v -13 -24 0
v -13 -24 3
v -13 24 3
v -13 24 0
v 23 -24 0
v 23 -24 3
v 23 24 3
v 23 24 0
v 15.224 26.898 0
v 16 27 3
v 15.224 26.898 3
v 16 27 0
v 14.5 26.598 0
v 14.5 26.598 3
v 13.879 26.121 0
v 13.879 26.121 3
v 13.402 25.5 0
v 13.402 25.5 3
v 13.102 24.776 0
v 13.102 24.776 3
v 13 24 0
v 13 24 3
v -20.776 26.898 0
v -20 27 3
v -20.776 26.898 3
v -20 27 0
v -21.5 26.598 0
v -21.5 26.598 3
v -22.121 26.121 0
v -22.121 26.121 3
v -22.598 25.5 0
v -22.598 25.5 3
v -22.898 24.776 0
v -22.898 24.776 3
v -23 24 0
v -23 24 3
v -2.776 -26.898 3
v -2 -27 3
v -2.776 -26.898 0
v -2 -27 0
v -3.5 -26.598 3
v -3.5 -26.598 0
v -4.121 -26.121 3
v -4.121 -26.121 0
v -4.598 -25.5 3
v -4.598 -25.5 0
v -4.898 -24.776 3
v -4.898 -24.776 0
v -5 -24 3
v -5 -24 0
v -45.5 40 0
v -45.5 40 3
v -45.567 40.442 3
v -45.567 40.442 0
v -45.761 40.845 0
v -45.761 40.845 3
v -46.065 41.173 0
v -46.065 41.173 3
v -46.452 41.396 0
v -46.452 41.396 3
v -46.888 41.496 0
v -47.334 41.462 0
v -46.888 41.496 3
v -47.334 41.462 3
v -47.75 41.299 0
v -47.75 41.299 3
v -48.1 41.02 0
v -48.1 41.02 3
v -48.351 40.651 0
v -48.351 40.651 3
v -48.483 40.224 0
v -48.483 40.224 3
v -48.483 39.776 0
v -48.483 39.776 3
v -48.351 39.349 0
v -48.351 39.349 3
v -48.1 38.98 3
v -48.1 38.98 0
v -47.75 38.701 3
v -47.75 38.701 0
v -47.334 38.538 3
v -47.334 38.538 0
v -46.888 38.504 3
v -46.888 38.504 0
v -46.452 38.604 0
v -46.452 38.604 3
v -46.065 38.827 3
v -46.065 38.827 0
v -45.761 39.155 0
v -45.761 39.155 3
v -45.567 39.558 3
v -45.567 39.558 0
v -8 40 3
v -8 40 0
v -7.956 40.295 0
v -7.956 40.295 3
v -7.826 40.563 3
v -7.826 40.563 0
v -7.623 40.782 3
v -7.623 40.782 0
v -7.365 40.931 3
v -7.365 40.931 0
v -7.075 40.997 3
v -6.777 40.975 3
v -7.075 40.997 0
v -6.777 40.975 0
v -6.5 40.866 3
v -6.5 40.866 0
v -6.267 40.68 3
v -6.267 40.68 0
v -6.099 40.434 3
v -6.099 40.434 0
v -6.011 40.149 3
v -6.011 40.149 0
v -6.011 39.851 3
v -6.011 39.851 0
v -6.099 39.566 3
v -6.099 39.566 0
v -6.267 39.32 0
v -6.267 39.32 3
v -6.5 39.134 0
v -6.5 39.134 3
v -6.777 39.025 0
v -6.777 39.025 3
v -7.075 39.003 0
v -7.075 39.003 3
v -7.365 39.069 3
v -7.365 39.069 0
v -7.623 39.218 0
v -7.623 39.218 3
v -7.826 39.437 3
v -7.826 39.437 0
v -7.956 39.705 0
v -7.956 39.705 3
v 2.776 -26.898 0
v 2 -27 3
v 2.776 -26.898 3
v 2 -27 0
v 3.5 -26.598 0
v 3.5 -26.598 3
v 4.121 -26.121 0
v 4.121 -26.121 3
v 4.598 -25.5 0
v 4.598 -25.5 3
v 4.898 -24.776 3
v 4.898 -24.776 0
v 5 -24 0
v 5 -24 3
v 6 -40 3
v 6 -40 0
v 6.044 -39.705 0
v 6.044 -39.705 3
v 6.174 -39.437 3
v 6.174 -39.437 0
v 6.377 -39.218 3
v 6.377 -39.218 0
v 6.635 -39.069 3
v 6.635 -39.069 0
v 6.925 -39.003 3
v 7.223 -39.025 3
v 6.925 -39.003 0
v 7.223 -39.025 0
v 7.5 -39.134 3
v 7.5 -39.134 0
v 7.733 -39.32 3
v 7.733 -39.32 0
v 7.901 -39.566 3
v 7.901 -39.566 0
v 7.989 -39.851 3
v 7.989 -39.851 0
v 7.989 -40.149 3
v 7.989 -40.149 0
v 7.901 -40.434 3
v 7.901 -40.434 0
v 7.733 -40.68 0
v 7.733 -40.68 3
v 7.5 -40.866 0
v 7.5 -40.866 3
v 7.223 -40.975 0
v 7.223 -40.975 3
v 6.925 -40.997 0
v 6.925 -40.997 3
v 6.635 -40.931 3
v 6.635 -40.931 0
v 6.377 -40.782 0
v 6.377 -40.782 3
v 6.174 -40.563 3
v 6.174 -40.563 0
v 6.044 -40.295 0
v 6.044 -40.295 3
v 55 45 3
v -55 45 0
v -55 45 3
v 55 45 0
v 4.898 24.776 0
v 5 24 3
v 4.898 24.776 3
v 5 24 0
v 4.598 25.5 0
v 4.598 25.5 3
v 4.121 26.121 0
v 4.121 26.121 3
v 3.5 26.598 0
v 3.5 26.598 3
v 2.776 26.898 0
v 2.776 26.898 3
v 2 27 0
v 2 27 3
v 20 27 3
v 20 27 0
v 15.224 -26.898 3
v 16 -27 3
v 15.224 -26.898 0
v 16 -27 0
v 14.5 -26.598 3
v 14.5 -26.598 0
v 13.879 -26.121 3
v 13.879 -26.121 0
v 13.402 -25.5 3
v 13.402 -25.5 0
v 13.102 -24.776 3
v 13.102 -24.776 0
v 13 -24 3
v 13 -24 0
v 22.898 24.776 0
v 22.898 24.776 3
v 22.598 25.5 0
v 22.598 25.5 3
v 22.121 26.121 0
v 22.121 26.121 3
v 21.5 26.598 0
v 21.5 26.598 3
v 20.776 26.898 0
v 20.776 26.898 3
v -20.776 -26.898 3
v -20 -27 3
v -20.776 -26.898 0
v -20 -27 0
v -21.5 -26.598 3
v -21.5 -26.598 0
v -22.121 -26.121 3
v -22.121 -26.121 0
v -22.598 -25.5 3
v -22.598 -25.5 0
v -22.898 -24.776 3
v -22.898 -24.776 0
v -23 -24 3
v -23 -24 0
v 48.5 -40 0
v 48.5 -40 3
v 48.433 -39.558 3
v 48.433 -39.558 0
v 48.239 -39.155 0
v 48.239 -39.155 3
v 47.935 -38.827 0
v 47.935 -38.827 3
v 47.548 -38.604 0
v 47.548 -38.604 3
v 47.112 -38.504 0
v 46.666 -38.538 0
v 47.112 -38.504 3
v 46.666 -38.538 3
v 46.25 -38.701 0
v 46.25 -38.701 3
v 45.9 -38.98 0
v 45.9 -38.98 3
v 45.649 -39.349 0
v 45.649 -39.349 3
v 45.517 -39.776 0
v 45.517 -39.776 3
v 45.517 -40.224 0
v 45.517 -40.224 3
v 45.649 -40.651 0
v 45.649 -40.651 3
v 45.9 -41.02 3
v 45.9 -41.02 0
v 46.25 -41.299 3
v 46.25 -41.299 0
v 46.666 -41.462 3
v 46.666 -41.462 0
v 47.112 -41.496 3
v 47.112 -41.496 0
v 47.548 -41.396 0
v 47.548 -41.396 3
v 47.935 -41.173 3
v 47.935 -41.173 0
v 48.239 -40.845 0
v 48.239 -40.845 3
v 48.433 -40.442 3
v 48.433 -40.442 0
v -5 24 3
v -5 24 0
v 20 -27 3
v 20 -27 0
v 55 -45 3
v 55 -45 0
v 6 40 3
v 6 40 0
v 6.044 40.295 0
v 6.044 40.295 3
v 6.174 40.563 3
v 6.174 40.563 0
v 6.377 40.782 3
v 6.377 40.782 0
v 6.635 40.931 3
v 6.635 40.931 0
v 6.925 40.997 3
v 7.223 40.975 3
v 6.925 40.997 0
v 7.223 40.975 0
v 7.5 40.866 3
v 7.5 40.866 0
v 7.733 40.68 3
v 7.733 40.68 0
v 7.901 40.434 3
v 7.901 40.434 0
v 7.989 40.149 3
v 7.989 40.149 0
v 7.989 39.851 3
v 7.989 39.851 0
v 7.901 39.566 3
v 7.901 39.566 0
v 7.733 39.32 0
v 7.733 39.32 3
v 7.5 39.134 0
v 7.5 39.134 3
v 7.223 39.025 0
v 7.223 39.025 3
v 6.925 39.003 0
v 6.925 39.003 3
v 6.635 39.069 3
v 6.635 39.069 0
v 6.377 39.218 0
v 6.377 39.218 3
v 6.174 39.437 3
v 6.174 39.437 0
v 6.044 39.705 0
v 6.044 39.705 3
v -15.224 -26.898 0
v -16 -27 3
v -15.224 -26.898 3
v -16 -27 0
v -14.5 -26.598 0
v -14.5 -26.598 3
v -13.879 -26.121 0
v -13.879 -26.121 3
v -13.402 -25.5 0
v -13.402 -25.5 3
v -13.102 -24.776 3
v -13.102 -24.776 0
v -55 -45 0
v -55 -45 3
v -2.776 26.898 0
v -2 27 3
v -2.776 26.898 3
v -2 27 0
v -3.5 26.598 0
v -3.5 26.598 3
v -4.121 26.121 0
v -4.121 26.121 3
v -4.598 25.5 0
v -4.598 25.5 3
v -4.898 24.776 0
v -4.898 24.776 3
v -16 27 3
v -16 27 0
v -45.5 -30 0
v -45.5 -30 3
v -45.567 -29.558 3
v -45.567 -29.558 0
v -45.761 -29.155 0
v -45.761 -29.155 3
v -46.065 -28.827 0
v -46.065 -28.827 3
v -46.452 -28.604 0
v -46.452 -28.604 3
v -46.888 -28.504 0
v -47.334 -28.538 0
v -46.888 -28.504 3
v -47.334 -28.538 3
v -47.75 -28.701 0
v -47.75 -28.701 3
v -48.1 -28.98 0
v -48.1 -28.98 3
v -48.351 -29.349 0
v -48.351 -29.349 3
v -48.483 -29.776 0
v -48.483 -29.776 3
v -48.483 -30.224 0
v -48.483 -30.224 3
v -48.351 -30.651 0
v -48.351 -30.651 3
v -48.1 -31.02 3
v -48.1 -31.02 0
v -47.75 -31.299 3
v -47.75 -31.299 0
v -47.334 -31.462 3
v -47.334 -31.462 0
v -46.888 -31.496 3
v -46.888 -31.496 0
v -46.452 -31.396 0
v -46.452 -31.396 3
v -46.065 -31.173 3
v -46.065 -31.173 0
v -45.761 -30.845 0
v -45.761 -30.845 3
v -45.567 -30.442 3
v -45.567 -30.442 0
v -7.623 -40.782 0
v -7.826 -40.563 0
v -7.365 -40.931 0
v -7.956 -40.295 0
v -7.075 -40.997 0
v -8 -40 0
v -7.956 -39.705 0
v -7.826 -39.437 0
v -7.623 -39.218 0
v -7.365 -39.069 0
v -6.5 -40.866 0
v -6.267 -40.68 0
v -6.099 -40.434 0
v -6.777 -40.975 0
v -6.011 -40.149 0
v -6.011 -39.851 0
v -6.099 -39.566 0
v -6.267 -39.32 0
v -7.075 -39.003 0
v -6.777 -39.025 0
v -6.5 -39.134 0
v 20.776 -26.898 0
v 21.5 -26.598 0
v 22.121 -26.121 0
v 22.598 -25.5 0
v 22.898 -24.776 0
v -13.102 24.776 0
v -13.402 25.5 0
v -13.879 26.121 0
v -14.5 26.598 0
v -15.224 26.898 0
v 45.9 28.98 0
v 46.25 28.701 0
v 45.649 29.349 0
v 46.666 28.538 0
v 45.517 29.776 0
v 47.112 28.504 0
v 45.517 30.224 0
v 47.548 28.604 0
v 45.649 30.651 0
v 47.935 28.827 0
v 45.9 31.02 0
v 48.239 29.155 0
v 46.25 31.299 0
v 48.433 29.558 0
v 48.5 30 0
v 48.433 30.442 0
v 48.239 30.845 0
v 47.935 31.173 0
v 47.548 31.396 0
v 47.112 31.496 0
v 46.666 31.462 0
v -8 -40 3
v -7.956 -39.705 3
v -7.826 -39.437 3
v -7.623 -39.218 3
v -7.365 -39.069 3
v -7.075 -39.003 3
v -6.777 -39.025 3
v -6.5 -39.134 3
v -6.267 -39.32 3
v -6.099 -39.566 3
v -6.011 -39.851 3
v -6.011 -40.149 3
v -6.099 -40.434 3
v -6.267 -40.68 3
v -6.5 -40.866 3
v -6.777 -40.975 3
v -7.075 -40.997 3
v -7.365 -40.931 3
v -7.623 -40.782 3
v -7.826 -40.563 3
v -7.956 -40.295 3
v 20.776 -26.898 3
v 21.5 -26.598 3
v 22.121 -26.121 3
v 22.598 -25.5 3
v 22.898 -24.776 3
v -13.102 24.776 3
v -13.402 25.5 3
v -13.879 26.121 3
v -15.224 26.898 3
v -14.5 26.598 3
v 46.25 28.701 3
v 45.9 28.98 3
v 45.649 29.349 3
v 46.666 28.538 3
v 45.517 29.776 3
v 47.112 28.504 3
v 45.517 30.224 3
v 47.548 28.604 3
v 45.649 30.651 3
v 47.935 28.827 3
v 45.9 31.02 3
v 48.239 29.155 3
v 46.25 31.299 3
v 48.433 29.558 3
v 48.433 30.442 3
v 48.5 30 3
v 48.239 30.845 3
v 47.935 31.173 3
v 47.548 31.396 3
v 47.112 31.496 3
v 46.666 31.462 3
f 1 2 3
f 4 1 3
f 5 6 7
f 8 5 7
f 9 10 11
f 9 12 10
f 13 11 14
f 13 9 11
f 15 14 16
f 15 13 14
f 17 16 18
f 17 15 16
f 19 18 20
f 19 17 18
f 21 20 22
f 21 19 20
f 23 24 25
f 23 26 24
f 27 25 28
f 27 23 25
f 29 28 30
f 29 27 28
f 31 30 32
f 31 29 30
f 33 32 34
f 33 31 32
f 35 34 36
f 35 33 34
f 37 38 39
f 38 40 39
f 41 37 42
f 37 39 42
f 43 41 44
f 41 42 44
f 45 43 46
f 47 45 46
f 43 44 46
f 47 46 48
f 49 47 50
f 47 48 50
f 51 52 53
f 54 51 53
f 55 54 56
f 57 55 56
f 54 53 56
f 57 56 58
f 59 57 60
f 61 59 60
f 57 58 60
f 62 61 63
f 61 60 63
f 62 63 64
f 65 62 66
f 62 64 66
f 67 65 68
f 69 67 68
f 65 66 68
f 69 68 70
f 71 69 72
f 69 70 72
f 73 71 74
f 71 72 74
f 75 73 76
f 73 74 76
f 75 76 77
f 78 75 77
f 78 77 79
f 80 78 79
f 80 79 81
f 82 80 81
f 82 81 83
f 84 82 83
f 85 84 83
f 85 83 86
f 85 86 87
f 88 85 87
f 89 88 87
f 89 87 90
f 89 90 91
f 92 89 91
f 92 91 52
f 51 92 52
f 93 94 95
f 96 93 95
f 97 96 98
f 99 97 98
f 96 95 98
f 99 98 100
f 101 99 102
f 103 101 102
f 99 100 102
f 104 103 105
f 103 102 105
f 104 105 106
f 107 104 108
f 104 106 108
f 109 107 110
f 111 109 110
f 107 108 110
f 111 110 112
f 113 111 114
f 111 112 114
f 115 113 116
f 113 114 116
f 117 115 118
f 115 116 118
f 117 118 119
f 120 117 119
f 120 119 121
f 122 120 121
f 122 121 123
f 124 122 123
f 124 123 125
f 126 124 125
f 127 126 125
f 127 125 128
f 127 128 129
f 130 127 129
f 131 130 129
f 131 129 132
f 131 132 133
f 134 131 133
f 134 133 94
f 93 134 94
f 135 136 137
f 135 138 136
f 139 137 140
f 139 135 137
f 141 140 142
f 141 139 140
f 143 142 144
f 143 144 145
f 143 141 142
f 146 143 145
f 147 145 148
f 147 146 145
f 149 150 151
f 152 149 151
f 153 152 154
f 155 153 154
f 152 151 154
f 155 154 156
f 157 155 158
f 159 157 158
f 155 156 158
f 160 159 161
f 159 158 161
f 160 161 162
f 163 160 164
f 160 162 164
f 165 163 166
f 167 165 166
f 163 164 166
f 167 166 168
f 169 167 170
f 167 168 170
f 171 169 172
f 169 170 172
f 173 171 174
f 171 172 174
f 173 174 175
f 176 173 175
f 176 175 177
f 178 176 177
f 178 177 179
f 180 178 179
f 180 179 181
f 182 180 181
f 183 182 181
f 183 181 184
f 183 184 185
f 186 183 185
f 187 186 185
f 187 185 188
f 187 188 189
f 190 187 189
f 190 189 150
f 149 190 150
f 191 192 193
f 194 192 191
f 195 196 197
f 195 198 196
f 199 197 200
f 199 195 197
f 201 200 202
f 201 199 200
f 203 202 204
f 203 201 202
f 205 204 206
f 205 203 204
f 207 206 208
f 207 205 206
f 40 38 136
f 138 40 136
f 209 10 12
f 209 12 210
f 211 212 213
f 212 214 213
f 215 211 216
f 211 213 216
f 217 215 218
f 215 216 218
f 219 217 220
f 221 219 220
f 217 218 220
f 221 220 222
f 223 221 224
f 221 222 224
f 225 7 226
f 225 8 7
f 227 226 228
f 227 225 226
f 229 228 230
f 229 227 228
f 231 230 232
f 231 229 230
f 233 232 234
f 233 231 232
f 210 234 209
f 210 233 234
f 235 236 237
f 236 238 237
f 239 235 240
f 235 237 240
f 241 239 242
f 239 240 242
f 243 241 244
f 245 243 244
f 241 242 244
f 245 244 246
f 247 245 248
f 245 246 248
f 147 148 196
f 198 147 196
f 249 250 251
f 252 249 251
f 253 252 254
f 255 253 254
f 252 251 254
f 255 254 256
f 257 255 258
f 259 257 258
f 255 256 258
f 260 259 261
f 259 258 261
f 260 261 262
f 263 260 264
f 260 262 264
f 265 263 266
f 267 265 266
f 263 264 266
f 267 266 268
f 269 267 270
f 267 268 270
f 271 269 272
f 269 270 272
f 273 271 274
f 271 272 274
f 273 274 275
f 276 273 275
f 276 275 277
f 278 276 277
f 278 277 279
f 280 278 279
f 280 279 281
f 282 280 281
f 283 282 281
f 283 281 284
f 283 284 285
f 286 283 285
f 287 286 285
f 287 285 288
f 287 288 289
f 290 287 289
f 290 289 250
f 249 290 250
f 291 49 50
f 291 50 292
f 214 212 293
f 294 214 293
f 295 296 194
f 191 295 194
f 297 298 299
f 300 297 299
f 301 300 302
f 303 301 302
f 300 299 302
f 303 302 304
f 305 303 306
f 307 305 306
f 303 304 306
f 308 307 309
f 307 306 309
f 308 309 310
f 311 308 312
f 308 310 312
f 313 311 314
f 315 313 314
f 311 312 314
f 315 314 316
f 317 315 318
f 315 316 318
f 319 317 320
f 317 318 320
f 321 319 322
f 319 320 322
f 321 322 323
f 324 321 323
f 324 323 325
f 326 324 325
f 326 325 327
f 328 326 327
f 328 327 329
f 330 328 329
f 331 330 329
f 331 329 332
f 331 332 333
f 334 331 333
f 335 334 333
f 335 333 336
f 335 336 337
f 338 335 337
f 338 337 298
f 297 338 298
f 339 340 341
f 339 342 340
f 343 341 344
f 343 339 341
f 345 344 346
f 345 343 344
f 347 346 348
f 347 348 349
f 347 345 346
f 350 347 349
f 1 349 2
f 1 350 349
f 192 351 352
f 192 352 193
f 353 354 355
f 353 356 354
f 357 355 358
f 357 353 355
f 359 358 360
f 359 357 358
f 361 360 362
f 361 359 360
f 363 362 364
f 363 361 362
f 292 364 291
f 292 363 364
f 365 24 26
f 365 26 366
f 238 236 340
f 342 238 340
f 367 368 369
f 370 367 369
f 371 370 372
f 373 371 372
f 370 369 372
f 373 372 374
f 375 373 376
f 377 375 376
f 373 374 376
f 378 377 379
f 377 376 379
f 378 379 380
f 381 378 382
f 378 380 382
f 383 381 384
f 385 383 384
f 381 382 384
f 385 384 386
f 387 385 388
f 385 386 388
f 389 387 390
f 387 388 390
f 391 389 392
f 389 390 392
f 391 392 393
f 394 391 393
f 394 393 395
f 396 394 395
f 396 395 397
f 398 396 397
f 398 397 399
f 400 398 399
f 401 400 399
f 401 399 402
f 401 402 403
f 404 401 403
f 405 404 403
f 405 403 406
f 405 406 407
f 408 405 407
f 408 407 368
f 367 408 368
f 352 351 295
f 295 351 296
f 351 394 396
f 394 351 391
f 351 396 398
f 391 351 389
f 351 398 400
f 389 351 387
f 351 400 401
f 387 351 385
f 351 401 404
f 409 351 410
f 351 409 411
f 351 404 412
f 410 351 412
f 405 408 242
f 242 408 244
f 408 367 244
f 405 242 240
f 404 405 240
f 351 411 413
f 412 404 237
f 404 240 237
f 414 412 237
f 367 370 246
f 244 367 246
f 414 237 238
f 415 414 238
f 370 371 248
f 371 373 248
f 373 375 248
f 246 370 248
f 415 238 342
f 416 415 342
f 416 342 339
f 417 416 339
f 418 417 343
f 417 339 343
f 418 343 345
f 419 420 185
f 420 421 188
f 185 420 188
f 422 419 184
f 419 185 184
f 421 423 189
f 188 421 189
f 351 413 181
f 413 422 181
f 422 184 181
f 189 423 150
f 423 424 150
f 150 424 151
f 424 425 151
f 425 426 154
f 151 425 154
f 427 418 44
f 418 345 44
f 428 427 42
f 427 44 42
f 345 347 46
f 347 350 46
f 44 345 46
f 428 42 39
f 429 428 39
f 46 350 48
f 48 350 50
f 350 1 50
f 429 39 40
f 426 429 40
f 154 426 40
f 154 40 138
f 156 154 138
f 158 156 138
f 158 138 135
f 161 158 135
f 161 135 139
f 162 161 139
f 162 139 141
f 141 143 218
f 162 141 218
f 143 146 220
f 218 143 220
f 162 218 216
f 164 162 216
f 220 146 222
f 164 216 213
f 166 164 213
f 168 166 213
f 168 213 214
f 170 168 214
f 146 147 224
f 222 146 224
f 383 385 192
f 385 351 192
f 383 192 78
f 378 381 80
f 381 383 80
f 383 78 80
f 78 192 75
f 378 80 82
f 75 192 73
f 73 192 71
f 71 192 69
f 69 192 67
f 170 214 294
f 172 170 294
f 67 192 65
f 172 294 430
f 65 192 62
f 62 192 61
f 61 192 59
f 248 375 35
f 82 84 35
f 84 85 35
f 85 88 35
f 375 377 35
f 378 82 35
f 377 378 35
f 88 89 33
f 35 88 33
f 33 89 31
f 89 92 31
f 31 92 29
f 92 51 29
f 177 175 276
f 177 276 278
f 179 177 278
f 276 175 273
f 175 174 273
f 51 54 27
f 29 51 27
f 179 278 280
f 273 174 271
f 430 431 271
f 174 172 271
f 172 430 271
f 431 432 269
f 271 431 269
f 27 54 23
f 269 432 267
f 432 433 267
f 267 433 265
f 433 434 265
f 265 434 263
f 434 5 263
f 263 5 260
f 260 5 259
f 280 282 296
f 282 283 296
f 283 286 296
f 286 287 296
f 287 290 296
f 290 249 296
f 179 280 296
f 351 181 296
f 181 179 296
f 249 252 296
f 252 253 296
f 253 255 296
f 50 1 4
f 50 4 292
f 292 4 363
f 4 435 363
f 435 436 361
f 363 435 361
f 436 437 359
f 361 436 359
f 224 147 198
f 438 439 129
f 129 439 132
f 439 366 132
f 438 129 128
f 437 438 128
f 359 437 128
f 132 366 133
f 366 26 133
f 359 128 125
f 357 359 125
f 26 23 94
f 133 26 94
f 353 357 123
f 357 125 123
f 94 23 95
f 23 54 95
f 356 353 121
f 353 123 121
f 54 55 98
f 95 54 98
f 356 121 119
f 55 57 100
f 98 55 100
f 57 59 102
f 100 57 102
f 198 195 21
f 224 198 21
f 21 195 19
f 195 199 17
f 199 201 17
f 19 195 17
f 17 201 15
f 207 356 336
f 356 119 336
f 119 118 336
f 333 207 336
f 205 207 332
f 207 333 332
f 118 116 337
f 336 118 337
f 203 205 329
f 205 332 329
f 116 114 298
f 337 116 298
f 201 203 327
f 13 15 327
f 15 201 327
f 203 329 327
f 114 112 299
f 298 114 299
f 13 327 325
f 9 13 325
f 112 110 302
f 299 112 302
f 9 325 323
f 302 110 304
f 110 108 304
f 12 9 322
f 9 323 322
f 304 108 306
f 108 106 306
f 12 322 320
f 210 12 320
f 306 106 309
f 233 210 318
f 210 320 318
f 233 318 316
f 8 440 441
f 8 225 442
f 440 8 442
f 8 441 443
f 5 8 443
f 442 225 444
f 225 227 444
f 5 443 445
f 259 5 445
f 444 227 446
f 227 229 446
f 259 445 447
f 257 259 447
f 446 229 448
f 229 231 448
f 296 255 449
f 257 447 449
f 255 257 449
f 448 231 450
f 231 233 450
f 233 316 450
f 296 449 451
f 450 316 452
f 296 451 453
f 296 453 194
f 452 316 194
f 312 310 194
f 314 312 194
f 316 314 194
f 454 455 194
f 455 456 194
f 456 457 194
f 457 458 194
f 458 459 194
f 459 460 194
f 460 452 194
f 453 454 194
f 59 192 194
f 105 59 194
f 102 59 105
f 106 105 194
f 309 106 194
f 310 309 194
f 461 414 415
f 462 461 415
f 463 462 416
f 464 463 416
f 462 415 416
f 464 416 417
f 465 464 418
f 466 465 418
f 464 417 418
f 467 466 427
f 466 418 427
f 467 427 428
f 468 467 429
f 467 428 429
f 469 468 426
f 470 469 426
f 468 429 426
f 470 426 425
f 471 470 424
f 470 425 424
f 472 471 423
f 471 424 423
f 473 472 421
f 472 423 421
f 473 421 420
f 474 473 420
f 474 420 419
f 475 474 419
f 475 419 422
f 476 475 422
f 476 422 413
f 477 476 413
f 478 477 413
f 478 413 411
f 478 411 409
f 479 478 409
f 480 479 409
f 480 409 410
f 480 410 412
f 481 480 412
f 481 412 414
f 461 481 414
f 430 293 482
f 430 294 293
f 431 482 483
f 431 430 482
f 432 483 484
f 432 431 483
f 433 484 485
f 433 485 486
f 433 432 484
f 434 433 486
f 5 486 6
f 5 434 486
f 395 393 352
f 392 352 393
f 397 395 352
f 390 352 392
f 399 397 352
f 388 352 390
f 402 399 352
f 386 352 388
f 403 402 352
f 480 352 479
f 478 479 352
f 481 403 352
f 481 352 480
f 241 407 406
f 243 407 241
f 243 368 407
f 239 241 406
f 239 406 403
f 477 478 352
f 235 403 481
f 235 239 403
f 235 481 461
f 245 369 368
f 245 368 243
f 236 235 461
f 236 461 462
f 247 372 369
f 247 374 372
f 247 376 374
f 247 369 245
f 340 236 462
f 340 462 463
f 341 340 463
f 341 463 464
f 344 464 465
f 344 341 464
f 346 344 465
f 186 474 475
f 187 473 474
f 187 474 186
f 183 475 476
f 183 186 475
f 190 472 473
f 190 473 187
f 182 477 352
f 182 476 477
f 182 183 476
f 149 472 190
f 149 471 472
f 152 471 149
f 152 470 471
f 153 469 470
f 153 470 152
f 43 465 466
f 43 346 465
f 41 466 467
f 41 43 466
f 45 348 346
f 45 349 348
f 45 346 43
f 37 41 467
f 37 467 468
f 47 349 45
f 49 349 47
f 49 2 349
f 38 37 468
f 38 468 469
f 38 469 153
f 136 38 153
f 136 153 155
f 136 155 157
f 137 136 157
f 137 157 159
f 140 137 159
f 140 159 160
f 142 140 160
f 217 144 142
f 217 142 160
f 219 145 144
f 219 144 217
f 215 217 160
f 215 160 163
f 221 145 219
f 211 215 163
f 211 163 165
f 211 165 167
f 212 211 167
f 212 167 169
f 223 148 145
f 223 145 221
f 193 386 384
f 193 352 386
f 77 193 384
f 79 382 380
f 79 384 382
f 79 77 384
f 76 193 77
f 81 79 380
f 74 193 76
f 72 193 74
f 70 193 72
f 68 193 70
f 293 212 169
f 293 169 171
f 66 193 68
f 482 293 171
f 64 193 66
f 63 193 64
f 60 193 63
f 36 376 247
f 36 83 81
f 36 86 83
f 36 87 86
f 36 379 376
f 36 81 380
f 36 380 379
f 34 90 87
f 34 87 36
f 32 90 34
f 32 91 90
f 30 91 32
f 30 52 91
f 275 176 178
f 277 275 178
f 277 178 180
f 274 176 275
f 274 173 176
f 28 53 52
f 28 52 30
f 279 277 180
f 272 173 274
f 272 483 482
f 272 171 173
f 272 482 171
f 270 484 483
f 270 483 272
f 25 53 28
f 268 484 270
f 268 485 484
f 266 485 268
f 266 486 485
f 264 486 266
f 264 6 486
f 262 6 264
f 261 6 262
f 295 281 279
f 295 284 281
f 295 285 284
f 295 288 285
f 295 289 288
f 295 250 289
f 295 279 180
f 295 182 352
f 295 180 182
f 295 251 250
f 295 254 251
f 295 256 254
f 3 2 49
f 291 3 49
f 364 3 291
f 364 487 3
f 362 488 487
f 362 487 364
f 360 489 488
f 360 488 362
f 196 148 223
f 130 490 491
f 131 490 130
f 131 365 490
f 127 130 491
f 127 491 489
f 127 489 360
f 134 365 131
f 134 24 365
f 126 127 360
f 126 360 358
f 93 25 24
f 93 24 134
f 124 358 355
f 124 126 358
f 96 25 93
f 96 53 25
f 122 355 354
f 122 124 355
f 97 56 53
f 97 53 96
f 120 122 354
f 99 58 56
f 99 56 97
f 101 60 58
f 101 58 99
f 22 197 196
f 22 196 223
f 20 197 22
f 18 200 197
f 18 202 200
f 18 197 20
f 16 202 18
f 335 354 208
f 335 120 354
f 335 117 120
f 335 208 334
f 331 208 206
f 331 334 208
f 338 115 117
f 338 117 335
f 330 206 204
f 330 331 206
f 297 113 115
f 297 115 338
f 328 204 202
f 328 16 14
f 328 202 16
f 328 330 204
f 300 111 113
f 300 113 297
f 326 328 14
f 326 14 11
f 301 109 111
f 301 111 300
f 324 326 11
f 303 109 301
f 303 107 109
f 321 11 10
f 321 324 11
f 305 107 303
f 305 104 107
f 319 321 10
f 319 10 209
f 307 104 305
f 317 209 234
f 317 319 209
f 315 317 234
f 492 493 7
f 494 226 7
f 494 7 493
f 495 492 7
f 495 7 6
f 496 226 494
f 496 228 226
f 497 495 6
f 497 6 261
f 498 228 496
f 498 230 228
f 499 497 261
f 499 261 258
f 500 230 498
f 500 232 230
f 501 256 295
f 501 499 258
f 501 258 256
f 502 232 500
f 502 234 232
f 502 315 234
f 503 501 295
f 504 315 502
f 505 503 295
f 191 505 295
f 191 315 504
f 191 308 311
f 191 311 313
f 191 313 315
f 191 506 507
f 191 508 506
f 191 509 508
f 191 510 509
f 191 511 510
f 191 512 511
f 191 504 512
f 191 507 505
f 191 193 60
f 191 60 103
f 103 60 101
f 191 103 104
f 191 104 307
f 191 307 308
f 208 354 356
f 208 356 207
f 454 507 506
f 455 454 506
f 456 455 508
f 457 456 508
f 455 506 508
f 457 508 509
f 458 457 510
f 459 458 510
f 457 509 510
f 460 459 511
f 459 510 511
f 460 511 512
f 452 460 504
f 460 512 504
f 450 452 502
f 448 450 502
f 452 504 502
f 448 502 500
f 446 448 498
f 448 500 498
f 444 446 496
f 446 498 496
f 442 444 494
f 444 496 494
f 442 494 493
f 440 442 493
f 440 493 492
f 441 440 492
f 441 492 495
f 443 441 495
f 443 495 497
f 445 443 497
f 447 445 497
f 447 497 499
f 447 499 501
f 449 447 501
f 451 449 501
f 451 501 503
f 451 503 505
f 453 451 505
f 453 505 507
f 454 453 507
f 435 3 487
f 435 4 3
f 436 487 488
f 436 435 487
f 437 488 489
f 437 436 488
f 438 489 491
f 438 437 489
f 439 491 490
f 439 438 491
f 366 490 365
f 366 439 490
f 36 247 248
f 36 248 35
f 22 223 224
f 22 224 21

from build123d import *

# Parameters (mm, degrees)
EXTRUDE_1_OUTLINE_W = 110
EXTRUDE_1_OUTLINE_H = 90
EXTRUDE_1_DEPTH     = 3
SKETCH_2_R          = 1.5
CUT_EXTRUDE_1_DEPTH = 10
SKETCH_4_R          = 1
CUT_EXTRUDE_2_DEPTH = 10
SKETCH_5_W          = 10
SKETCH_5_H          = 54
CUT_EXTRUDE_3_DEPTH = 72.126647608
FILLET_1_R          = 3


# Read off the part's stored shape, not the designer's step: 凸台-拉伸1
with BuildPart() as part:
    # 凸台-拉伸1 outline → 凸台-拉伸1 (new body)
    with BuildSketch(Plane.XY):
        Rectangle(EXTRUDE_1_OUTLINE_W, EXTRUDE_1_OUTLINE_H)
    extrude(amount=EXTRUDE_1_DEPTH)

    # 草图2 → 切除-拉伸1 (cut)
    with BuildSketch(Plane.XY.offset(3)):
        with Locations((-47, 40)):
            Circle(SKETCH_2_R)
        with Locations((47, 30)):
            Circle(SKETCH_2_R)
        with Locations((47, -40)):
            Circle(SKETCH_2_R)
        with Locations((-47, -30)):
            Circle(SKETCH_2_R)
    extrude(amount=-CUT_EXTRUDE_1_DEPTH, mode=Mode.SUBTRACT)

    # 草图4 → 切除-拉伸2 (cut)
    with BuildSketch(Plane(origin=(0, 0, 0), x_dir=(-1, 0, 0), z_dir=(0, 0, -1))):
        with Locations((-7, 40)):
            Circle(SKETCH_4_R)
        with Locations((7, 40)):
            Circle(SKETCH_4_R)
        with Locations((-7, -40)):
            Circle(SKETCH_4_R)
        with Locations((7, -40)):
            Circle(SKETCH_4_R)
    extrude(amount=-CUT_EXTRUDE_2_DEPTH, mode=Mode.SUBTRACT)

    # 草图5 → 切除-拉伸3 (cut, through all)
    with BuildSketch(Plane.XY.offset(3)):
        with Locations((-18, 0)):
            Rectangle(SKETCH_5_W, SKETCH_5_H)
        Rectangle(SKETCH_5_W, SKETCH_5_H)
        with Locations((18, 0)):
            Rectangle(SKETCH_5_W, SKETCH_5_H)
    extrude(amount=-CUT_EXTRUDE_3_DEPTH, mode=Mode.SUBTRACT)

    # 圆角1
    fillet_1_edges = [part.edges().sort_by_distance(p)[0] for p in [
        (-23, -27, 1.5),
        (-23, 27, 1.5),
        (-13, 27, 1.5),
        (-13, -27, 1.5),
        (-5, -27, 1.5),
        (-5, 27, 1.5),
        (5, 27, 1.5),
        (5, -27, 1.5),
        (13, -27, 1.5),
        (13, 27, 1.5),
        (23, 27, 1.5),
        (23, -27, 1.5),
    ]]
    fillet(fillet_1_edges, radius=FILLET_1_R)


solid = part.part
